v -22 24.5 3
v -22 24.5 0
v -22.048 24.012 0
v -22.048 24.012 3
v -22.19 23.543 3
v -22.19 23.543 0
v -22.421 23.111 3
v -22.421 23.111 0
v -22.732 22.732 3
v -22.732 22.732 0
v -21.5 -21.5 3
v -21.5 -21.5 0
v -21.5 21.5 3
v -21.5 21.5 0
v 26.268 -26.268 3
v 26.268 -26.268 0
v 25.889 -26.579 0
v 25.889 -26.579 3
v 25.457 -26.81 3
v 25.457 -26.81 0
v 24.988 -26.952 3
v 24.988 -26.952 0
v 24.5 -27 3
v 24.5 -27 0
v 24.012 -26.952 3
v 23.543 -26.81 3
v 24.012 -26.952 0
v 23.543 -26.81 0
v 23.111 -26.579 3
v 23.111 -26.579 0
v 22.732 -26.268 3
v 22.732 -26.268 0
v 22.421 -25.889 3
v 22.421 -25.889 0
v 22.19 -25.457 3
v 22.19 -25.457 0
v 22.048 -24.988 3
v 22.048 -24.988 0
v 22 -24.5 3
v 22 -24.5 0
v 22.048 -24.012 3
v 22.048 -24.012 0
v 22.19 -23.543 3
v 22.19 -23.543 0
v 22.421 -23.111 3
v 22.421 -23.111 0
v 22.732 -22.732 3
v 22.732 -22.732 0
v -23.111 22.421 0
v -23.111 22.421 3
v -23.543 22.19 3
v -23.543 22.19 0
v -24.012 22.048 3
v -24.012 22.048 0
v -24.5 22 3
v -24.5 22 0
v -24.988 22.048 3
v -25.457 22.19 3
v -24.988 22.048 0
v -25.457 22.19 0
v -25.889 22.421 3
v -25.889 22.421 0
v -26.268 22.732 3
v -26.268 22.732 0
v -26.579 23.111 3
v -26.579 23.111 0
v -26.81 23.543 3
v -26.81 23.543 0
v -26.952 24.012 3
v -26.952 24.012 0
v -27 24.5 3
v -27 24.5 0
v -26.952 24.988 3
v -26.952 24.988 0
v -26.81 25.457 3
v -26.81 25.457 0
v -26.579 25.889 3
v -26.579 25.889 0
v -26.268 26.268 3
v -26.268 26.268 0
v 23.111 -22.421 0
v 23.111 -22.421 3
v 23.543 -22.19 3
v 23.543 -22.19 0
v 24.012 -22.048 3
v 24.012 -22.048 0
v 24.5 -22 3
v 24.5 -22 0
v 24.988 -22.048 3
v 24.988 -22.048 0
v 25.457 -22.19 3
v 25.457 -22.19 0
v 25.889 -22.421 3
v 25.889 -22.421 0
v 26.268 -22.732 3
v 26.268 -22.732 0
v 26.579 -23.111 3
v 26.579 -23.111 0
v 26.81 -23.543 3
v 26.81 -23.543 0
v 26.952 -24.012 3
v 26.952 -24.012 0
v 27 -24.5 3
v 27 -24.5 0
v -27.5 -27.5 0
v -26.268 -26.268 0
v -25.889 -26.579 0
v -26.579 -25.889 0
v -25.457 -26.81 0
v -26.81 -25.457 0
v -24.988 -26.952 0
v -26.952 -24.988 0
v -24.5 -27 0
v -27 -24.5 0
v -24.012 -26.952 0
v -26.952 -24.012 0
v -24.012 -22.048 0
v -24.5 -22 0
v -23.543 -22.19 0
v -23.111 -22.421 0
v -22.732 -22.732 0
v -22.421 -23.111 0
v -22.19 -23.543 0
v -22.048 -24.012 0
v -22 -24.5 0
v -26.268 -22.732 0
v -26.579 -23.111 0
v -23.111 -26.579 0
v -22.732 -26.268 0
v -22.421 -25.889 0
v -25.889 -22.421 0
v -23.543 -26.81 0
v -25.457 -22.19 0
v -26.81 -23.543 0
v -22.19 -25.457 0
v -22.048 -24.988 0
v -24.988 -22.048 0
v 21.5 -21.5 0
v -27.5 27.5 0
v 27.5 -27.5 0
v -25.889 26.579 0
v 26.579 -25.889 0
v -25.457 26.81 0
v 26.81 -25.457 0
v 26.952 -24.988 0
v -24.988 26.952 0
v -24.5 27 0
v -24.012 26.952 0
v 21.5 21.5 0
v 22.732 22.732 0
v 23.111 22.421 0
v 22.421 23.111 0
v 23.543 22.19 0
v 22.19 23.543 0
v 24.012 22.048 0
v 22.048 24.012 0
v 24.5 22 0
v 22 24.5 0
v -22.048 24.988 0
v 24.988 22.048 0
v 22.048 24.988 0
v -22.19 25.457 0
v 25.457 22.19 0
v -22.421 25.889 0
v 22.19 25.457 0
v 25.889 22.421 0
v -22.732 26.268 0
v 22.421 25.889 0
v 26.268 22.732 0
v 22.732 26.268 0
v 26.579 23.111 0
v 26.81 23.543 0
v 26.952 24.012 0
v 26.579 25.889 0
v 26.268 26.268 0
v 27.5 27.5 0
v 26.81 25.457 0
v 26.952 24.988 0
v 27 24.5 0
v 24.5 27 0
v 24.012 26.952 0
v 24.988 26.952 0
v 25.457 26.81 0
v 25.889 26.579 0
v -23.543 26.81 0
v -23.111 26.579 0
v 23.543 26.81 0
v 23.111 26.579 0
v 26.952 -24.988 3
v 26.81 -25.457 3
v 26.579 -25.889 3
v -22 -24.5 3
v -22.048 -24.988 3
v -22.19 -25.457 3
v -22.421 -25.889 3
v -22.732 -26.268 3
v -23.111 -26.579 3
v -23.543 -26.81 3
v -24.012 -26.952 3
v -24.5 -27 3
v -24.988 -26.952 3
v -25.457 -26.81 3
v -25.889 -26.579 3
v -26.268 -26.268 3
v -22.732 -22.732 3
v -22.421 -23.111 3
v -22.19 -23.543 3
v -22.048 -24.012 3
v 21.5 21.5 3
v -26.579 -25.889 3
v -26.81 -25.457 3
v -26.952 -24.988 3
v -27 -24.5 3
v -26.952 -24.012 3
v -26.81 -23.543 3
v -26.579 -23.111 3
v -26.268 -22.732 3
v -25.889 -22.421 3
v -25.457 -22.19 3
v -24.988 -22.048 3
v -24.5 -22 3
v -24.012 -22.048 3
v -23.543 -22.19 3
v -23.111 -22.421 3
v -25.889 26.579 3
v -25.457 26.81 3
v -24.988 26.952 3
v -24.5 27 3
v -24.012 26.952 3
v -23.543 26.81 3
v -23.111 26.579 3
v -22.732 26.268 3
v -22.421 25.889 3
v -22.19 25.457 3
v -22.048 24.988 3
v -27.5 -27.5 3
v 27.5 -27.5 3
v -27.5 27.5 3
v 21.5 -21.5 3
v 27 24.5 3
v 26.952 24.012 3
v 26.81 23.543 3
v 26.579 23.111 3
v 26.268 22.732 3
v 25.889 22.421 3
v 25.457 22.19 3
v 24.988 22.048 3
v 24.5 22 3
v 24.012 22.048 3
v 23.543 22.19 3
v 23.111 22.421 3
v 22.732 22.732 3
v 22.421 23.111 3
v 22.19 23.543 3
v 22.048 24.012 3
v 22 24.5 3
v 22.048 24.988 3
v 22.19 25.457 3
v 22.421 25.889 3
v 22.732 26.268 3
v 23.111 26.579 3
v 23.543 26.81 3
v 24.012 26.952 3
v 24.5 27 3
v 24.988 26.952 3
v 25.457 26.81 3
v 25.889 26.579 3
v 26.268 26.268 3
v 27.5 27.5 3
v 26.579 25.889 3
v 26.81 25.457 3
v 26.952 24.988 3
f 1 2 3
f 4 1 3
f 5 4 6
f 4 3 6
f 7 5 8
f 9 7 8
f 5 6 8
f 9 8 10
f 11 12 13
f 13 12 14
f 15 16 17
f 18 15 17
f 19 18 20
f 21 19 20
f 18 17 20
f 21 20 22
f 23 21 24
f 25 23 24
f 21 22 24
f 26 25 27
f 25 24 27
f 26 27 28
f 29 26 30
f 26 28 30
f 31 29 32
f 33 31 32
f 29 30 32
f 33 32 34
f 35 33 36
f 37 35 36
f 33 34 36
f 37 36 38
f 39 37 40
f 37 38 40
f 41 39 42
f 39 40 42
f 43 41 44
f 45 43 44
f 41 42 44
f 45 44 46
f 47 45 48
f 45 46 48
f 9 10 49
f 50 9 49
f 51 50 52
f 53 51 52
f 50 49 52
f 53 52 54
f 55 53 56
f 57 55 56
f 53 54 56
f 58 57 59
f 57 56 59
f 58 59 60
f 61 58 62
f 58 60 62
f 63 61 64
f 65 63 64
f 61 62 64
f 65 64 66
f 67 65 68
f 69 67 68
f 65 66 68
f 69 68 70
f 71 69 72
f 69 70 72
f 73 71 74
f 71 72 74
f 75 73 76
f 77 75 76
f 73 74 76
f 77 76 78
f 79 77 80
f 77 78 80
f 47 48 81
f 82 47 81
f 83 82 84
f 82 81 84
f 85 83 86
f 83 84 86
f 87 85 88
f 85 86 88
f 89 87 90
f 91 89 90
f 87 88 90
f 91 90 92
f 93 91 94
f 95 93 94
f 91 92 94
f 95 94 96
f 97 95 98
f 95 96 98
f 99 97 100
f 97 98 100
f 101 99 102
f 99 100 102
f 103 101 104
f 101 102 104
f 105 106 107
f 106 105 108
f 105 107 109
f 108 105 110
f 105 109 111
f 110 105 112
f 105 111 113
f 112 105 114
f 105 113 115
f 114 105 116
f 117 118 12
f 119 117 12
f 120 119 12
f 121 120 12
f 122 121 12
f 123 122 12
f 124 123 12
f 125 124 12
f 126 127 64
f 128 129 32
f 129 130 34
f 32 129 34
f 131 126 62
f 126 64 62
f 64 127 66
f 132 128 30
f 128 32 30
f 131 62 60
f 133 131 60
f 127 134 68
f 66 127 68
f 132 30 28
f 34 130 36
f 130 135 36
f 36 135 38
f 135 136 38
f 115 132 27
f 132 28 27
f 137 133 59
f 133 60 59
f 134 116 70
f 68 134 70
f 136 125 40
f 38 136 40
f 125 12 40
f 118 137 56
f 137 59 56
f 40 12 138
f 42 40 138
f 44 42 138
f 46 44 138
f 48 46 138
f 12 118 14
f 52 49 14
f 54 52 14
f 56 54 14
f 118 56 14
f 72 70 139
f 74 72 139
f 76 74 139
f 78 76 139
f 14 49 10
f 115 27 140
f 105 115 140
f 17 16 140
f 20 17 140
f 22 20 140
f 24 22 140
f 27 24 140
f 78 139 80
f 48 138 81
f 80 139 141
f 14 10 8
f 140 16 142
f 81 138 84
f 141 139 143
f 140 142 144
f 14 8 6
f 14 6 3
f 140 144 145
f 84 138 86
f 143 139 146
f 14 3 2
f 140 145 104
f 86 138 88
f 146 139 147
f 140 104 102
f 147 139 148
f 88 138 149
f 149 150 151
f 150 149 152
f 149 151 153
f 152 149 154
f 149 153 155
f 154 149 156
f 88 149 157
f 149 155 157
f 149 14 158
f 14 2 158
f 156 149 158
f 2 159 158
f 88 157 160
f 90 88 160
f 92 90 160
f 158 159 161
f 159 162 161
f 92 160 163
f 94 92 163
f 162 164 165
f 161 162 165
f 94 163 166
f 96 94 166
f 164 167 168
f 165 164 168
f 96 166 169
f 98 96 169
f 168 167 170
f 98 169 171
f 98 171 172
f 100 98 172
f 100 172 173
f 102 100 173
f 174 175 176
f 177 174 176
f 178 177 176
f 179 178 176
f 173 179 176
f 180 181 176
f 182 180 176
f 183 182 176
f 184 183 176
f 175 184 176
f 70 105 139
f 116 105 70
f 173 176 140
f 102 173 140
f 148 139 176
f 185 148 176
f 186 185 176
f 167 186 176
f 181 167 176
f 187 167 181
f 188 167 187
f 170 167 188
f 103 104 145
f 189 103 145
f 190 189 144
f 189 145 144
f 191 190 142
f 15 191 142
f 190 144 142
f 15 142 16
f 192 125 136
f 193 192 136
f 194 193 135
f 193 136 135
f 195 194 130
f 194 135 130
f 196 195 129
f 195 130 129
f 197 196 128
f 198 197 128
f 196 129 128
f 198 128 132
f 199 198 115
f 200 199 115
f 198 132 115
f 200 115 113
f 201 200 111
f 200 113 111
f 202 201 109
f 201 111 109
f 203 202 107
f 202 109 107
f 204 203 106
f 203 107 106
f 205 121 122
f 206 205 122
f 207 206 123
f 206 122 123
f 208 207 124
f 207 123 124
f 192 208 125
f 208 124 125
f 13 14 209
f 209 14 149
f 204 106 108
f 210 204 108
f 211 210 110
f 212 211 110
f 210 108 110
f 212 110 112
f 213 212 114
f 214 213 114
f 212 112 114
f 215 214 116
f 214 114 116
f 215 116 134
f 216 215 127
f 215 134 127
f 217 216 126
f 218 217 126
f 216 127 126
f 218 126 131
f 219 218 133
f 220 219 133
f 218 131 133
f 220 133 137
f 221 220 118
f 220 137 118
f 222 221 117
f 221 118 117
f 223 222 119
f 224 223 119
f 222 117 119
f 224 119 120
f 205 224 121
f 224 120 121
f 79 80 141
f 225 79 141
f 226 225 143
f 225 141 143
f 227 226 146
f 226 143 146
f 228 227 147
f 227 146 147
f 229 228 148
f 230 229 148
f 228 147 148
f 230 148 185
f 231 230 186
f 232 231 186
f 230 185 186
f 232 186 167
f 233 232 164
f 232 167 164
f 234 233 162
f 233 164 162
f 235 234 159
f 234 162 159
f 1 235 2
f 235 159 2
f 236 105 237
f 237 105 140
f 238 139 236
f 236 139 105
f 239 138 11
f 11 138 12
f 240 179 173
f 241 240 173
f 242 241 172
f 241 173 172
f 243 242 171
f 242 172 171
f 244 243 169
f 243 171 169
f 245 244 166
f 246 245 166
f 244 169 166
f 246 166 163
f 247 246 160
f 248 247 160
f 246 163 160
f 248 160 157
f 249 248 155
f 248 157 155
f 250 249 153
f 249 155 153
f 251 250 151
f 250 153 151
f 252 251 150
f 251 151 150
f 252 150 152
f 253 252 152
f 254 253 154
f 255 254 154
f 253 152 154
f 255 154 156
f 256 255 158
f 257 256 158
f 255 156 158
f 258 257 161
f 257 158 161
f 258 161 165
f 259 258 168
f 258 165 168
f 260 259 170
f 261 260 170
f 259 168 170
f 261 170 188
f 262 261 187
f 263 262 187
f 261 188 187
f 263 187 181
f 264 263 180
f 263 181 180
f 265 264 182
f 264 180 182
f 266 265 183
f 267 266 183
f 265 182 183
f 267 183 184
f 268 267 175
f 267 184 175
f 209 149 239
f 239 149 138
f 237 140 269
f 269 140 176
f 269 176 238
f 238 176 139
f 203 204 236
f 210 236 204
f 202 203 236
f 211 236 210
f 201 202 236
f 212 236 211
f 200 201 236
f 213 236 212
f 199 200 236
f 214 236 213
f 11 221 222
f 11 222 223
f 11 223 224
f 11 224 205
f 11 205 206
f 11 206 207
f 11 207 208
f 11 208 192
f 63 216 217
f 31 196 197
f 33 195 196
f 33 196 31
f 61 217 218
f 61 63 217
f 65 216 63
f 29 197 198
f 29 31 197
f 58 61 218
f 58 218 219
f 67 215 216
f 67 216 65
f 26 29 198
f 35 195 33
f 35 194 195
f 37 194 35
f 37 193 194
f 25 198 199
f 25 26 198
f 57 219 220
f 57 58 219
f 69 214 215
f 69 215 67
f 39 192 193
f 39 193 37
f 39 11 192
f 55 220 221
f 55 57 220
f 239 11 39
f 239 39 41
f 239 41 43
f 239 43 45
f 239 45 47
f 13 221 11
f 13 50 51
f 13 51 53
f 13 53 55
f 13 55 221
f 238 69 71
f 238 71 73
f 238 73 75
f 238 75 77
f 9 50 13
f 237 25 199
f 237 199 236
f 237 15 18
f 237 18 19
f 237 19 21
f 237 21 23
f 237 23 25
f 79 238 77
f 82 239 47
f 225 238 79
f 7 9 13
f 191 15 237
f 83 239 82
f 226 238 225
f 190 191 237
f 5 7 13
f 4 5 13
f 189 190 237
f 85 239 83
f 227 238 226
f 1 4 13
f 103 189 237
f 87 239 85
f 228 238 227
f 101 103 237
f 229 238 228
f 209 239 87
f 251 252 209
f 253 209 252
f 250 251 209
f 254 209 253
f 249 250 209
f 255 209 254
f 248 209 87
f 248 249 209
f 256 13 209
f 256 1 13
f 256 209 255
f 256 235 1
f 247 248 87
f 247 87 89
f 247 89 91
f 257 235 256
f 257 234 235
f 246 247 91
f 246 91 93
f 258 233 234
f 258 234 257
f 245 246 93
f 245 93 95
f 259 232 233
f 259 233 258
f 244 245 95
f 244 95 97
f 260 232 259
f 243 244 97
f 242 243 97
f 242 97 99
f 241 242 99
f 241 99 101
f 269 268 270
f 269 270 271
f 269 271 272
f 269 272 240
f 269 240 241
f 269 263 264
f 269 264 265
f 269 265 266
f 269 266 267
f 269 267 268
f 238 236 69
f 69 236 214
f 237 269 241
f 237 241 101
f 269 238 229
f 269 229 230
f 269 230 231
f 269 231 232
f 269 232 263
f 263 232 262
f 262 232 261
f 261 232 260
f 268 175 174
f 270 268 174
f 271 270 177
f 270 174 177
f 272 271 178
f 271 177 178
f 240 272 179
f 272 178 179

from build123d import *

# Parameters (mm, degrees)
F1_DEPTH = 3


with BuildPart() as f1:
    # F0 (on Top) → F1 (new body)
    with BuildSketch(Plane.XY):
        with BuildLine():
            Line((-26.267767, 26.267767), (-27.5, 27.5))
            Line((-27.5, 27.5), (-27.5, -27.5))
            Line((-27.5, -27.5), (-26.267767, -26.267767))
            ThreePointArc((-26.267767, -26.267767), (-26.267767, -22.732233), (-22.732233, -22.732233))
            Line((-22.732233, -22.732233), (-21.5, -21.5))
            Line((-21.5, -21.5), (-21.5, 21.5))
            Line((-21.5, 21.5), (-22.732233, 22.732233))
            ThreePointArc((-22.732233, 22.732233), (-26.267767, 22.732233), (-26.267767, 26.267767))
        make_face()
        with BuildLine():
            Line((-27.5, -27.5), (27.5, -27.5))
            Line((27.5, -27.5), (26.267767, -26.267767))
            ThreePointArc((26.267767, -26.267767), (22.732233, -26.267767), (22.732233, -22.732233))
            Line((22.732233, -22.732233), (21.5, -21.5))
            Line((21.5, -21.5), (-21.5, -21.5))
            Line((-21.5, -21.5), (-22.732233, -22.732233))
            ThreePointArc((-22.732233, -22.732233), (-22.190301, -23.543291), (-22, -24.5))
            ThreePointArc((-22, -24.5), (-23.543291, -26.809699), (-26.267767, -26.267767))
            Line((-26.267767, -26.267767), (-27.5, -27.5))
        make_face()
        with BuildLine():
            Line((27.5, -27.5), (27.5, 27.5))
            Line((27.5, 27.5), (26.267767, 26.267767))
            ThreePointArc((26.267767, 26.267767), (26.809699, 25.456709), (27, 24.5))
            ThreePointArc((27, 24.5), (25.456709, 22.190301), (22.732233, 22.732233))
            Line((22.732233, 22.732233), (21.5, 21.5))
            Line((21.5, 21.5), (21.5, -21.5))
            Line((21.5, -21.5), (22.732233, -22.732233))
            ThreePointArc((22.732233, -22.732233), (25.456709, -22.190301), (27, -24.5))
            ThreePointArc((27, -24.5), (26.809699, -25.456709), (26.267767, -26.267767))
            Line((26.267767, -26.267767), (27.5, -27.5))
        make_face()
        with BuildLine():
            Line((26.267767, 26.267767), (27.5, 27.5))
            Line((27.5, 27.5), (-27.5, 27.5))
            Line((-27.5, 27.5), (-26.267767, 26.267767))
            ThreePointArc((-26.267767, 26.267767), (-23.543291, 26.809699), (-22, 24.5))
            ThreePointArc((-22, 24.5), (-22.190301, 23.543291), (-22.732233, 22.732233))
            Line((-22.732233, 22.732233), (-21.5, 21.5))
            Line((-21.5, 21.5), (21.5, 21.5))
            Line((21.5, 21.5), (22.732233, 22.732233))
            ThreePointArc((22.732233, 22.732233), (22.732233, 26.267767), (26.267767, 26.267767))
        make_face()
    extrude(amount=F1_DEPTH)


solid = f1.part
